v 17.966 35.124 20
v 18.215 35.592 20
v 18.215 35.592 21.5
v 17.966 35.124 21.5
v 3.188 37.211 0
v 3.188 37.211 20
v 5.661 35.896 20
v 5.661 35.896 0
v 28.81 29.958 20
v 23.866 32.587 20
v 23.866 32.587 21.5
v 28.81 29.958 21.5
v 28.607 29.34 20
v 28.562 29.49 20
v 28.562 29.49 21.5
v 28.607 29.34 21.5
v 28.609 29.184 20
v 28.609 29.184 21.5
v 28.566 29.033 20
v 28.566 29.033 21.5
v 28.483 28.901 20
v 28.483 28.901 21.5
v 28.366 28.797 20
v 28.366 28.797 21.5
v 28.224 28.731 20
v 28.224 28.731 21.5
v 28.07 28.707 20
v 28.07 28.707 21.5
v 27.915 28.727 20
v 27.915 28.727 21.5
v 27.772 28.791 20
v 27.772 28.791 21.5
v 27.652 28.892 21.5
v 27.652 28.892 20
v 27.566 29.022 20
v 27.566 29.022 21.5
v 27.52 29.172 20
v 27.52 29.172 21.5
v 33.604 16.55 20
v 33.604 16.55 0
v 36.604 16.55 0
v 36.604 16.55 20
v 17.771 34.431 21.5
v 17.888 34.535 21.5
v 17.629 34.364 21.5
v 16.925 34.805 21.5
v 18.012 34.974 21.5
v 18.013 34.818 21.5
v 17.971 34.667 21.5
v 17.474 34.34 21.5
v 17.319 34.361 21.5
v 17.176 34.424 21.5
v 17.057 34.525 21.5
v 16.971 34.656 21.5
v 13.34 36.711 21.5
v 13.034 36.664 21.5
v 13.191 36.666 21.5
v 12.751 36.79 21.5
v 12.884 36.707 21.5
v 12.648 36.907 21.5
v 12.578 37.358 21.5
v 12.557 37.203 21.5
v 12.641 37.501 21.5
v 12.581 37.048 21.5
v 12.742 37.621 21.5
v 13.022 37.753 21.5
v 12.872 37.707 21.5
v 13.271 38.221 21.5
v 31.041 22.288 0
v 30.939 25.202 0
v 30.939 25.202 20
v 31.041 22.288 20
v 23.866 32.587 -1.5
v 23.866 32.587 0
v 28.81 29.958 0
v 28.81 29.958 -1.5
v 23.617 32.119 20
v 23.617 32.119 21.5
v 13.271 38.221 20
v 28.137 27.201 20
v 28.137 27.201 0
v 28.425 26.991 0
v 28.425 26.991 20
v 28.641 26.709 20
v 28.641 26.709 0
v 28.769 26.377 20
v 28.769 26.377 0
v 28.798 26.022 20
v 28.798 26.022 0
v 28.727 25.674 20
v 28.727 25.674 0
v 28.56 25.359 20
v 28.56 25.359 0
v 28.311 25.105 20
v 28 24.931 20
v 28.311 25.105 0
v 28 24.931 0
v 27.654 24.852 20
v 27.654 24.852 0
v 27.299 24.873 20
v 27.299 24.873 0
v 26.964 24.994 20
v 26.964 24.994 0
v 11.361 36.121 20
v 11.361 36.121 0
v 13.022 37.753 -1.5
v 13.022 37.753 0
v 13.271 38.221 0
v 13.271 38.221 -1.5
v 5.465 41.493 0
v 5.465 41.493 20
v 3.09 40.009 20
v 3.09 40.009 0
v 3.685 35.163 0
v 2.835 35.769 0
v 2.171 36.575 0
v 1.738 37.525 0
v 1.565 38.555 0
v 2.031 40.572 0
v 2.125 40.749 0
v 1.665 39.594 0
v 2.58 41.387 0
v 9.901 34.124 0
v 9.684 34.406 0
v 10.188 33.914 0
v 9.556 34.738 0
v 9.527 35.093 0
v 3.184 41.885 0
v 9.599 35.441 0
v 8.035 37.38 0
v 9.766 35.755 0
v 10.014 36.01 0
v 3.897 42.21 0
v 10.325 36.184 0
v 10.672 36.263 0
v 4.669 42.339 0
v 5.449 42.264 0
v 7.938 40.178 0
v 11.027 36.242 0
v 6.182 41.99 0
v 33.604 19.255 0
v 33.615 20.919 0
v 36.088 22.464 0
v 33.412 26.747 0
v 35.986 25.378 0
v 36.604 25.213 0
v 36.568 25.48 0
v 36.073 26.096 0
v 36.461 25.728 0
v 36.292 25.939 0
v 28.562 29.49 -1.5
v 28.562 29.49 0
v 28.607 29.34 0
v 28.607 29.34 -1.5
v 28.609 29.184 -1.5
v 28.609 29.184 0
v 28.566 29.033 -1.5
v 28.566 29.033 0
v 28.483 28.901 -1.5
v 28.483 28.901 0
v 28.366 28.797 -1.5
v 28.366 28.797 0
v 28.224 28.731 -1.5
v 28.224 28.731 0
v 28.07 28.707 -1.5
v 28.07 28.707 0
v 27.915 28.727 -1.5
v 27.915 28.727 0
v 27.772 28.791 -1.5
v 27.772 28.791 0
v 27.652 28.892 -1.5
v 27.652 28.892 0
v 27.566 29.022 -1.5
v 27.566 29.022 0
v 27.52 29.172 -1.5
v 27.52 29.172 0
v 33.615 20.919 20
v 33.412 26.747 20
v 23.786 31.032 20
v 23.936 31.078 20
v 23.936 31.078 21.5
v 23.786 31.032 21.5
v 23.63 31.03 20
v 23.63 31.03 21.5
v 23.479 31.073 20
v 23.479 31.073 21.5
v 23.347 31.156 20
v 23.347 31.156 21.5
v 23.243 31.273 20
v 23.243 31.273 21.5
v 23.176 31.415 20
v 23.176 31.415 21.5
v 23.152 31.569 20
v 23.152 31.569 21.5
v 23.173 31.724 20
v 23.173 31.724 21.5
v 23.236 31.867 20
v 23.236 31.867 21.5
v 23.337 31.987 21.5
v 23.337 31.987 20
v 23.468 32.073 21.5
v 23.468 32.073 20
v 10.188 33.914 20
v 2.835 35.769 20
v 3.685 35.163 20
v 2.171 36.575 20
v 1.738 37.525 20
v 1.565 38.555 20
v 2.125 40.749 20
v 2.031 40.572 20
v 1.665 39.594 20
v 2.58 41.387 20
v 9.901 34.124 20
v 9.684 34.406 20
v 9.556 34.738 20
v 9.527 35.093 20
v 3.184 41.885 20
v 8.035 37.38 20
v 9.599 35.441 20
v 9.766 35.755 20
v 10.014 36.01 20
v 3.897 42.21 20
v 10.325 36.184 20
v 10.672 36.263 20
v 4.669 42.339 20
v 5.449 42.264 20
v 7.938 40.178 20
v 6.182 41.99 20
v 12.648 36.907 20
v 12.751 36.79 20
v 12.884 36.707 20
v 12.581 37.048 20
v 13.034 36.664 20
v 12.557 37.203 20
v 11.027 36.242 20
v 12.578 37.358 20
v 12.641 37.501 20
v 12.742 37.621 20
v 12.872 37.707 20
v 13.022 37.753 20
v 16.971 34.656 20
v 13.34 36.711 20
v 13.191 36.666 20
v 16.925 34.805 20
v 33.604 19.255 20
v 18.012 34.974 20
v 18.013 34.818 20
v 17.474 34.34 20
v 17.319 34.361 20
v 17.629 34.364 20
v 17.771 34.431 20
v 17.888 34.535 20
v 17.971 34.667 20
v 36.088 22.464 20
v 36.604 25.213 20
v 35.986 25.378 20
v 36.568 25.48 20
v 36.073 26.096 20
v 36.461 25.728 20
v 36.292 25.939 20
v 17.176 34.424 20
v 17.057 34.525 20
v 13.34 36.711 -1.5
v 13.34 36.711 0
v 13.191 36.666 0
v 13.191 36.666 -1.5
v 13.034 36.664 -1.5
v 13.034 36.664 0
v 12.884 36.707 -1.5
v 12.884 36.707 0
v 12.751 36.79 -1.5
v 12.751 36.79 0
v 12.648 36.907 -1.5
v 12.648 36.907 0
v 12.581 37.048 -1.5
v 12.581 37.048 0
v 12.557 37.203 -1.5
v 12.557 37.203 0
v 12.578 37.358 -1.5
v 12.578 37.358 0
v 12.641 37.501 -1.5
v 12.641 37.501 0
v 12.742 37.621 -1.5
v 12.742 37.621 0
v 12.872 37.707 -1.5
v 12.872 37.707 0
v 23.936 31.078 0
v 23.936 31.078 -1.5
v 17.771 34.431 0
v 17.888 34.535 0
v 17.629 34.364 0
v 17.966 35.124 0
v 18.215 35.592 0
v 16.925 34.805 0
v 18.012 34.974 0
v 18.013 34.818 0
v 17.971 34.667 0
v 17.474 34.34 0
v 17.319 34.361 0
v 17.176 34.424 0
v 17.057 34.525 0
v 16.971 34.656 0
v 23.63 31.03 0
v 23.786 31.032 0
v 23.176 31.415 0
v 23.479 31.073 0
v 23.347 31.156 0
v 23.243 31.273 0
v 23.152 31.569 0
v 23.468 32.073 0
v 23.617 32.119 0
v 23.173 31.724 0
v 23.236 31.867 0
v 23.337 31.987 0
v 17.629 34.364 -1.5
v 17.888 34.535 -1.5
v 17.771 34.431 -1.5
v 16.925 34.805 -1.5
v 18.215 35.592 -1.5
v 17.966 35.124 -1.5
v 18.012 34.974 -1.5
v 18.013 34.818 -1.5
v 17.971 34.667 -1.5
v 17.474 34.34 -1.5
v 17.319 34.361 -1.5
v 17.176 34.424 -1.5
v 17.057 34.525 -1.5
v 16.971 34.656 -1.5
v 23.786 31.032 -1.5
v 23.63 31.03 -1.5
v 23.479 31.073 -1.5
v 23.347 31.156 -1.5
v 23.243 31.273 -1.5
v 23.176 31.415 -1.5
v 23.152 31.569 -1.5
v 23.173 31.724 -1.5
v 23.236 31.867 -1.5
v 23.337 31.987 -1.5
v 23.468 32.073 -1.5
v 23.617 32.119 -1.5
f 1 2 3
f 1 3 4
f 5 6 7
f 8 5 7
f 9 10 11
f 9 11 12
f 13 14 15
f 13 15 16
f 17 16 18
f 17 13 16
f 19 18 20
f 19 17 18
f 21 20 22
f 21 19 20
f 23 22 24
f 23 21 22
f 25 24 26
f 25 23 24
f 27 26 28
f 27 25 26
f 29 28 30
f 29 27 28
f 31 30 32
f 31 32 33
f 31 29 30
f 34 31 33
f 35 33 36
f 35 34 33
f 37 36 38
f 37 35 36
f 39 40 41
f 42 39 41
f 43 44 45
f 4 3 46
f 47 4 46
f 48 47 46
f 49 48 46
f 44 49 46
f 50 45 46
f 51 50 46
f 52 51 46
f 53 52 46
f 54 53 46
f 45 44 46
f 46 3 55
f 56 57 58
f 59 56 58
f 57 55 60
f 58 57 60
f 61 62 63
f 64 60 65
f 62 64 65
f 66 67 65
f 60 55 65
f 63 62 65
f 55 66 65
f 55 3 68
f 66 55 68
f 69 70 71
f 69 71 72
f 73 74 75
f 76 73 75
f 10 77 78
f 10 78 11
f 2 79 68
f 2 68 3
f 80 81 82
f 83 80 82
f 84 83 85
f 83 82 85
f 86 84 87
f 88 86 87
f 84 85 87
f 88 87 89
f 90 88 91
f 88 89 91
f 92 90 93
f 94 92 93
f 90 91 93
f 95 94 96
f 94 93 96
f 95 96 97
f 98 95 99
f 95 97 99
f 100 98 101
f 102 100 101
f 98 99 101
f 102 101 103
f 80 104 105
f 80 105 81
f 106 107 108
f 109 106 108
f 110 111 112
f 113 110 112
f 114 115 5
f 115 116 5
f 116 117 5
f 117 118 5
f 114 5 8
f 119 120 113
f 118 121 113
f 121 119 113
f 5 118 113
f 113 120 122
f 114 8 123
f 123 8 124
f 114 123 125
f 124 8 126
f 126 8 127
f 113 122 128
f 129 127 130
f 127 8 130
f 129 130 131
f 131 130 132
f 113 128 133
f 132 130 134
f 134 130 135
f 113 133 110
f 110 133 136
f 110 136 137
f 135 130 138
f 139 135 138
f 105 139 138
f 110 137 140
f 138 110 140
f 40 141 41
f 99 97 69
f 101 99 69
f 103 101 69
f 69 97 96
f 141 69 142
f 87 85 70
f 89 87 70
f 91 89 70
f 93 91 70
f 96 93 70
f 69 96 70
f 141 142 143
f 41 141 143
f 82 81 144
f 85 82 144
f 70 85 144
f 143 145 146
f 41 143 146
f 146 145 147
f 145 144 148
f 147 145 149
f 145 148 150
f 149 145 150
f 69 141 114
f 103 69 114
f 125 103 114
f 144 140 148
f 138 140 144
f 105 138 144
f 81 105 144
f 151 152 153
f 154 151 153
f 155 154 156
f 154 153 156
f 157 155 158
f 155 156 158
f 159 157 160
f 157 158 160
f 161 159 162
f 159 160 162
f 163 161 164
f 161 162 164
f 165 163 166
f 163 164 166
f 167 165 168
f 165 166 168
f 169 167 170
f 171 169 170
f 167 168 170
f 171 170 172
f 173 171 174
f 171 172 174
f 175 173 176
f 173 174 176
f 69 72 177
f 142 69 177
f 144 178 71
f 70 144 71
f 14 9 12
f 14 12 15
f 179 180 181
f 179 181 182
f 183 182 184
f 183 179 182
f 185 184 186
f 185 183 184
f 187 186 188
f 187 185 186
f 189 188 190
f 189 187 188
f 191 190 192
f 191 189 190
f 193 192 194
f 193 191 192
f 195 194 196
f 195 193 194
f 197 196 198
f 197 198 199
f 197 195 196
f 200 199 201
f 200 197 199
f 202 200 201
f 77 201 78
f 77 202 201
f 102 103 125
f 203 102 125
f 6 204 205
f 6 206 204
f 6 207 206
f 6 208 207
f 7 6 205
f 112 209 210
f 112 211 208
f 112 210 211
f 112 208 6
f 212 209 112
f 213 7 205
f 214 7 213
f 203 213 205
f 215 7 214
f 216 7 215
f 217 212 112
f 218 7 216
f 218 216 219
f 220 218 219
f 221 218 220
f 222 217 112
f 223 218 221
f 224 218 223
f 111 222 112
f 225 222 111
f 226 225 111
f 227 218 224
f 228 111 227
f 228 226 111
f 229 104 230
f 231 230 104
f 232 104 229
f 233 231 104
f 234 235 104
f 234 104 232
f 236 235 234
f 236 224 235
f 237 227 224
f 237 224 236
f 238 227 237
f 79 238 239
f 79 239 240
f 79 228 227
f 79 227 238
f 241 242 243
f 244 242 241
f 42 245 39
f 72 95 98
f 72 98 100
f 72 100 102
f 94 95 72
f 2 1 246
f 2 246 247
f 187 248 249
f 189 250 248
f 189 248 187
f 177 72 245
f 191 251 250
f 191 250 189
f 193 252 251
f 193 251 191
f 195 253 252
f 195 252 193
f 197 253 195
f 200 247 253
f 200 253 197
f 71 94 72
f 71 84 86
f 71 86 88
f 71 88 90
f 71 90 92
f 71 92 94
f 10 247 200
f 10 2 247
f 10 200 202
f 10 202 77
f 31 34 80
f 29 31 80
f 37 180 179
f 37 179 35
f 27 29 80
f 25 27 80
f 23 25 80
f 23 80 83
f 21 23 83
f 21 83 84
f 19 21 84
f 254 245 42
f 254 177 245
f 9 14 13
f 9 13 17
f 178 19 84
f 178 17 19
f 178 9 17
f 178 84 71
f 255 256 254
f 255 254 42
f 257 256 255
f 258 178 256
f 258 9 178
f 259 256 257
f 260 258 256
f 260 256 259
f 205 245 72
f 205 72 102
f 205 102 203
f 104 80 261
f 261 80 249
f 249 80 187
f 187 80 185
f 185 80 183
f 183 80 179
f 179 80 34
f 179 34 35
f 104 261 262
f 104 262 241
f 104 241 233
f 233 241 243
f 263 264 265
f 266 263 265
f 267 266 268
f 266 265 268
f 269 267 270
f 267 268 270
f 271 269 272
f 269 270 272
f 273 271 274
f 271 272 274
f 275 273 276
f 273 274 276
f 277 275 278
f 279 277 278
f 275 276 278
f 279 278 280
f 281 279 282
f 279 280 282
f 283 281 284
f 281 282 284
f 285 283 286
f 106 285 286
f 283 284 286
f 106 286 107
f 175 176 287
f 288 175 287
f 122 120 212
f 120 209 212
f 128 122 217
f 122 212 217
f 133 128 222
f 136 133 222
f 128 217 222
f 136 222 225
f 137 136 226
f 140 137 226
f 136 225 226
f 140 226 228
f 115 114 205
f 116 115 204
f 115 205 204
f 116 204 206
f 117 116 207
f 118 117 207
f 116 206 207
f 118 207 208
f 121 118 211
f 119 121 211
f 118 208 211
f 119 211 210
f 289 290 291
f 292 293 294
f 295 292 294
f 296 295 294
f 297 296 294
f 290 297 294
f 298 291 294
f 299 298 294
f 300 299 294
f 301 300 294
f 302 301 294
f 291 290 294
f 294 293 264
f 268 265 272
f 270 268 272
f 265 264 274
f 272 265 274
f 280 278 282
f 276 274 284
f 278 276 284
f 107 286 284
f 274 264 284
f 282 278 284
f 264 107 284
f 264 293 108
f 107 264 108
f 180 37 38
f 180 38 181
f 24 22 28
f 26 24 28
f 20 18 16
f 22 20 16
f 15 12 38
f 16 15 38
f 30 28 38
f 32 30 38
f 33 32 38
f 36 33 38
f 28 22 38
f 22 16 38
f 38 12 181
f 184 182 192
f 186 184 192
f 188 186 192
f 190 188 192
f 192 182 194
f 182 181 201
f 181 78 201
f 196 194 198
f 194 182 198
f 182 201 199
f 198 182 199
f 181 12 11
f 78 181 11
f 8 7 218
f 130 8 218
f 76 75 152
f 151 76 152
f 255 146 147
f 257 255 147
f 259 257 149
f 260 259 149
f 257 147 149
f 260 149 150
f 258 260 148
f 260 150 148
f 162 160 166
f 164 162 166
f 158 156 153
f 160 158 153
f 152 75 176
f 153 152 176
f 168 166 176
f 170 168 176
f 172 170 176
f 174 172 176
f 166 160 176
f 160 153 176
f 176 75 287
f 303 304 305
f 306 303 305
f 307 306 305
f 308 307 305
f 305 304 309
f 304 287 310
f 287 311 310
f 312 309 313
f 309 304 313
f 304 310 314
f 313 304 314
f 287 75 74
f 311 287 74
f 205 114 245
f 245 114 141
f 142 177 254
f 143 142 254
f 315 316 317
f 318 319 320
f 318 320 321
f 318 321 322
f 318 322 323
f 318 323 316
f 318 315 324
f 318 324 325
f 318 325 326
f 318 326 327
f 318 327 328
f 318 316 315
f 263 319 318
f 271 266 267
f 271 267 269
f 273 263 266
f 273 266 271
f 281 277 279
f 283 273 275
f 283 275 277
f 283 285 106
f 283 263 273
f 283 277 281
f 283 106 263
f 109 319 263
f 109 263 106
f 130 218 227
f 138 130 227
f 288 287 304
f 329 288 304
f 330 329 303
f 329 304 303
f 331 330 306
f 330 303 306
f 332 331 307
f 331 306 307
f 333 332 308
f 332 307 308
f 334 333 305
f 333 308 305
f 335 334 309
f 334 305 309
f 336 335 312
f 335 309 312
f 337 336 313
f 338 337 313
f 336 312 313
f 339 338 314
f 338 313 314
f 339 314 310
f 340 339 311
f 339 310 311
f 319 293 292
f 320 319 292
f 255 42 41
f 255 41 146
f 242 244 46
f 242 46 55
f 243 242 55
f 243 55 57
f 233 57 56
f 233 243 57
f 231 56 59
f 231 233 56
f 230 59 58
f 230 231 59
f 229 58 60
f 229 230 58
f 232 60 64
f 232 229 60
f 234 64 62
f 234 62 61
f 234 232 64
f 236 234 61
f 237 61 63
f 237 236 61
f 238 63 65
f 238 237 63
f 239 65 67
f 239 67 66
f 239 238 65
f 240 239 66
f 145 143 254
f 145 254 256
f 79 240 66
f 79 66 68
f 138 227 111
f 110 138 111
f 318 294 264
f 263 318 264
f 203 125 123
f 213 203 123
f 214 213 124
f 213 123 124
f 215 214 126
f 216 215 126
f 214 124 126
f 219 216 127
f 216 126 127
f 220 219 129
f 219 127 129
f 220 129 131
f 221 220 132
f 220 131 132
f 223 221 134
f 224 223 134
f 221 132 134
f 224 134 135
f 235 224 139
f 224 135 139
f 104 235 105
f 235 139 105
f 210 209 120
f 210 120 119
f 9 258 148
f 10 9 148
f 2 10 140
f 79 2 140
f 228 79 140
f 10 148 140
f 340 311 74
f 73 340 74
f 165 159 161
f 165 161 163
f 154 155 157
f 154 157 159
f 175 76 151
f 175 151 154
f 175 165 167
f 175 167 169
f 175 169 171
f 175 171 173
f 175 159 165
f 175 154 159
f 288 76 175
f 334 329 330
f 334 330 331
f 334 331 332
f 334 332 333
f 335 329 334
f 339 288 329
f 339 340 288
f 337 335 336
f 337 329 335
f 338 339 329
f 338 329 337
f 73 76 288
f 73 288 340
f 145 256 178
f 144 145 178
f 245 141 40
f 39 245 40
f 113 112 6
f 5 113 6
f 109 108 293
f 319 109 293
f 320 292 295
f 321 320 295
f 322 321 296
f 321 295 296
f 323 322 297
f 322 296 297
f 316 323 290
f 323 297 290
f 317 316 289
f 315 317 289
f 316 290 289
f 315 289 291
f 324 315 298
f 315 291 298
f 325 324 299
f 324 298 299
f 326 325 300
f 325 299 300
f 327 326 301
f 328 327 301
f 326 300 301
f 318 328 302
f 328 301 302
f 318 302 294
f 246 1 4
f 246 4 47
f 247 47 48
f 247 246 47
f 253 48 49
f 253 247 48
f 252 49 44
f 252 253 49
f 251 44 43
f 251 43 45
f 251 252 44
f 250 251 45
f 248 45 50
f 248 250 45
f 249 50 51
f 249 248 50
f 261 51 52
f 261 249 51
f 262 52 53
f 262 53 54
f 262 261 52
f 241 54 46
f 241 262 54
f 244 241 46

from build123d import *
from OCP.BRepFilletAPI import BRepFilletAPI_MakeFillet

# Parameters (mm, degrees)
BASE_SHAPE_DEPTH          = 20
EARS_DEPTH                = 1.5
EARS_2_DEPTH              = 1.5
GOPRO_BATTERY_STRAP_DEPTH = 20
CUT_EXTRUDE2_DEPTH        = 20
FILLET1_R1                = 3
FILLET1_R2                = 4


with BuildPart() as part:
    # Sketch1 → Base shape (new body)
    with BuildSketch(Plane.XY):
        with BuildLine():
            Line((0.153164223, 37.040707748), (33.603923048, 19.254623784))
            Line((33.603923048, 19.254623784), (33.603923048, 16.55))
            Line((33.603923048, 16.55), (36.603923048, 16.55))
            Line((36.603923048, 16.55), (36.603923048, 25.213139235))
            ThreePointArc((36.603923048, 25.213139235), (36.461090349, 25.72817731), (36.073394611, 26.096086828))
            Line((36.073394611, 26.096086828), (3.533359475, 43.397930417))
            Line((3.533359475, 43.397930417), (0.153164223, 37.040707748))
        make_face()
    extrude(amount=BASE_SHAPE_DEPTH)


with BuildPart() as body_2:
    # Sketch2 → Ears (new body)
    with BuildSketch(Plane(origin=(0, 0, 0), x_dir=(-1, 0, 0), z_dir=(0, 0, -1))):
        with BuildLine():
            ThreePointArc((-13.340223149, 36.71118744), (-12.581057932, 37.048498329), (-13.021812565, 37.752661532))
            Line((-13.021812565, 37.752661532), (-13.270593843, 38.220551065))
            Line((-13.270593843, 38.220551065), (-18.215100363, 35.591510313))
            Line((-18.215100363, 35.591510313), (-17.966319085, 35.12362078))
            ThreePointArc((-17.966319085, 35.12362078), (-17.629008197, 34.364455562), (-16.924844994, 34.805210196))
            Line((-16.924844994, 34.805210196), (-13.340223149, 36.71118744))
        make_face()
    ears = extrude(amount=EARS_DEPTH)


with BuildPart() as body_3:
    # Sketch2 → Ears 2 (new body)
    with BuildSketch(Plane(origin=(0, 0, 0), x_dir=(-1, 0, 0), z_dir=(0, 0, -1))):
        with BuildLine():
            Line((-23.61718368, 32.119002778), (-23.865964957, 32.586892311))
            Line((-23.865964957, 32.586892311), (-28.810471477, 29.95785156))
            Line((-28.810471477, 29.95785156), (-28.5616902, 29.489962027))
            ThreePointArc((-28.5616902, 29.489962027), (-28.224379311, 28.730796809), (-27.520216108, 29.171551443))
            Line((-27.520216108, 29.171551443), (-23.935594263, 31.077528687))
            ThreePointArc((-23.935594263, 31.077528687), (-23.176429046, 31.414839575), (-23.61718368, 32.119002778))
        make_face()
    ears_2 = extrude(amount=EARS_2_DEPTH)


with BuildPart() as part_1:
    add(part.part)

    # Ear mirror: Ears, Ears 2 across plane
    add(ears.mirror(Plane(origin=(0, 0, 10), x_dir=(1, 0, 0), z_dir=(0, 0, -1))))
    add(ears_2.mirror(Plane(origin=(0, 0, 10), x_dir=(1, 0, 0), z_dir=(0, 0, -1))))

    # Sketch3 → GoPro battery strap (cut)
    with BuildSketch(Plane(origin=(0, 0, 0), x_dir=(-1, 0, 0), z_dir=(0, 0, -1))):
        with BuildLine():
            Line((-26.963809088, 24.993746603), (-10.187804823, 33.913706296))
            ThreePointArc((-10.187804823, 33.913706296), (-9.670959786, 35.604230241), (-11.36148373, 36.121075278))
            Line((-11.36148373, 36.121075278), (-28.137487995, 27.201115585))
            ThreePointArc((-28.137487995, 27.201115585), (-28.654333032, 25.510591641), (-26.963809088, 24.993746603))
        make_face()
    extrude(amount=-GOPRO_BATTERY_STRAP_DEPTH, mode=Mode.SUBTRACT)

    # Sketch5 → Cut-Extrude2 (cut)
    with BuildSketch(Plane.XY.offset(20)):
        Polygon((30.93926782, 25.201726304), (31.041021451, 22.287883561), (33.615360104, 20.919083418), (36.087945127, 22.464126019), (35.986191496, 25.377968762), (33.411852843, 26.746768905), align=None)
        Polygon((5.465117061, 41.493054899), (3.090456198, 40.009202104), (3.188179982, 37.210759074), (5.660564629, 35.896168838), (8.035225493, 37.380021633), (7.937501709, 40.178464663), align=None)
    extrude(amount=-CUT_EXTRUDE2_DEPTH, mode=Mode.SUBTRACT)

    # Fillet1: one fillet with a radius per group of edges: ONE call of the kernel's fillet builder (fillet() takes one radius for all edges)
    fillet1_edges_1 = [part_1.edges().sort_by_distance(p)[0] for p in [
        (3.533359475, 43.397930417, 10),
    ]]
    fillet1_edges_2 = [part_1.edges().sort_by_distance(p)[0] for p in [
        (0.153164223, 37.040707748, 10),
    ]]
    fillet1 = BRepFilletAPI_MakeFillet(part_1.part.solid().wrapped)
    for e in fillet1_edges_1:
        fillet1.Add(FILLET1_R1, e.wrapped)
    for e in fillet1_edges_2:
        fillet1.Add(FILLET1_R2, e.wrapped)
    add(Compound.cast(fillet1.Shape()), mode=Mode.REPLACE)


solid = Compound([body_2.part, body_3.part, part_1.part])
